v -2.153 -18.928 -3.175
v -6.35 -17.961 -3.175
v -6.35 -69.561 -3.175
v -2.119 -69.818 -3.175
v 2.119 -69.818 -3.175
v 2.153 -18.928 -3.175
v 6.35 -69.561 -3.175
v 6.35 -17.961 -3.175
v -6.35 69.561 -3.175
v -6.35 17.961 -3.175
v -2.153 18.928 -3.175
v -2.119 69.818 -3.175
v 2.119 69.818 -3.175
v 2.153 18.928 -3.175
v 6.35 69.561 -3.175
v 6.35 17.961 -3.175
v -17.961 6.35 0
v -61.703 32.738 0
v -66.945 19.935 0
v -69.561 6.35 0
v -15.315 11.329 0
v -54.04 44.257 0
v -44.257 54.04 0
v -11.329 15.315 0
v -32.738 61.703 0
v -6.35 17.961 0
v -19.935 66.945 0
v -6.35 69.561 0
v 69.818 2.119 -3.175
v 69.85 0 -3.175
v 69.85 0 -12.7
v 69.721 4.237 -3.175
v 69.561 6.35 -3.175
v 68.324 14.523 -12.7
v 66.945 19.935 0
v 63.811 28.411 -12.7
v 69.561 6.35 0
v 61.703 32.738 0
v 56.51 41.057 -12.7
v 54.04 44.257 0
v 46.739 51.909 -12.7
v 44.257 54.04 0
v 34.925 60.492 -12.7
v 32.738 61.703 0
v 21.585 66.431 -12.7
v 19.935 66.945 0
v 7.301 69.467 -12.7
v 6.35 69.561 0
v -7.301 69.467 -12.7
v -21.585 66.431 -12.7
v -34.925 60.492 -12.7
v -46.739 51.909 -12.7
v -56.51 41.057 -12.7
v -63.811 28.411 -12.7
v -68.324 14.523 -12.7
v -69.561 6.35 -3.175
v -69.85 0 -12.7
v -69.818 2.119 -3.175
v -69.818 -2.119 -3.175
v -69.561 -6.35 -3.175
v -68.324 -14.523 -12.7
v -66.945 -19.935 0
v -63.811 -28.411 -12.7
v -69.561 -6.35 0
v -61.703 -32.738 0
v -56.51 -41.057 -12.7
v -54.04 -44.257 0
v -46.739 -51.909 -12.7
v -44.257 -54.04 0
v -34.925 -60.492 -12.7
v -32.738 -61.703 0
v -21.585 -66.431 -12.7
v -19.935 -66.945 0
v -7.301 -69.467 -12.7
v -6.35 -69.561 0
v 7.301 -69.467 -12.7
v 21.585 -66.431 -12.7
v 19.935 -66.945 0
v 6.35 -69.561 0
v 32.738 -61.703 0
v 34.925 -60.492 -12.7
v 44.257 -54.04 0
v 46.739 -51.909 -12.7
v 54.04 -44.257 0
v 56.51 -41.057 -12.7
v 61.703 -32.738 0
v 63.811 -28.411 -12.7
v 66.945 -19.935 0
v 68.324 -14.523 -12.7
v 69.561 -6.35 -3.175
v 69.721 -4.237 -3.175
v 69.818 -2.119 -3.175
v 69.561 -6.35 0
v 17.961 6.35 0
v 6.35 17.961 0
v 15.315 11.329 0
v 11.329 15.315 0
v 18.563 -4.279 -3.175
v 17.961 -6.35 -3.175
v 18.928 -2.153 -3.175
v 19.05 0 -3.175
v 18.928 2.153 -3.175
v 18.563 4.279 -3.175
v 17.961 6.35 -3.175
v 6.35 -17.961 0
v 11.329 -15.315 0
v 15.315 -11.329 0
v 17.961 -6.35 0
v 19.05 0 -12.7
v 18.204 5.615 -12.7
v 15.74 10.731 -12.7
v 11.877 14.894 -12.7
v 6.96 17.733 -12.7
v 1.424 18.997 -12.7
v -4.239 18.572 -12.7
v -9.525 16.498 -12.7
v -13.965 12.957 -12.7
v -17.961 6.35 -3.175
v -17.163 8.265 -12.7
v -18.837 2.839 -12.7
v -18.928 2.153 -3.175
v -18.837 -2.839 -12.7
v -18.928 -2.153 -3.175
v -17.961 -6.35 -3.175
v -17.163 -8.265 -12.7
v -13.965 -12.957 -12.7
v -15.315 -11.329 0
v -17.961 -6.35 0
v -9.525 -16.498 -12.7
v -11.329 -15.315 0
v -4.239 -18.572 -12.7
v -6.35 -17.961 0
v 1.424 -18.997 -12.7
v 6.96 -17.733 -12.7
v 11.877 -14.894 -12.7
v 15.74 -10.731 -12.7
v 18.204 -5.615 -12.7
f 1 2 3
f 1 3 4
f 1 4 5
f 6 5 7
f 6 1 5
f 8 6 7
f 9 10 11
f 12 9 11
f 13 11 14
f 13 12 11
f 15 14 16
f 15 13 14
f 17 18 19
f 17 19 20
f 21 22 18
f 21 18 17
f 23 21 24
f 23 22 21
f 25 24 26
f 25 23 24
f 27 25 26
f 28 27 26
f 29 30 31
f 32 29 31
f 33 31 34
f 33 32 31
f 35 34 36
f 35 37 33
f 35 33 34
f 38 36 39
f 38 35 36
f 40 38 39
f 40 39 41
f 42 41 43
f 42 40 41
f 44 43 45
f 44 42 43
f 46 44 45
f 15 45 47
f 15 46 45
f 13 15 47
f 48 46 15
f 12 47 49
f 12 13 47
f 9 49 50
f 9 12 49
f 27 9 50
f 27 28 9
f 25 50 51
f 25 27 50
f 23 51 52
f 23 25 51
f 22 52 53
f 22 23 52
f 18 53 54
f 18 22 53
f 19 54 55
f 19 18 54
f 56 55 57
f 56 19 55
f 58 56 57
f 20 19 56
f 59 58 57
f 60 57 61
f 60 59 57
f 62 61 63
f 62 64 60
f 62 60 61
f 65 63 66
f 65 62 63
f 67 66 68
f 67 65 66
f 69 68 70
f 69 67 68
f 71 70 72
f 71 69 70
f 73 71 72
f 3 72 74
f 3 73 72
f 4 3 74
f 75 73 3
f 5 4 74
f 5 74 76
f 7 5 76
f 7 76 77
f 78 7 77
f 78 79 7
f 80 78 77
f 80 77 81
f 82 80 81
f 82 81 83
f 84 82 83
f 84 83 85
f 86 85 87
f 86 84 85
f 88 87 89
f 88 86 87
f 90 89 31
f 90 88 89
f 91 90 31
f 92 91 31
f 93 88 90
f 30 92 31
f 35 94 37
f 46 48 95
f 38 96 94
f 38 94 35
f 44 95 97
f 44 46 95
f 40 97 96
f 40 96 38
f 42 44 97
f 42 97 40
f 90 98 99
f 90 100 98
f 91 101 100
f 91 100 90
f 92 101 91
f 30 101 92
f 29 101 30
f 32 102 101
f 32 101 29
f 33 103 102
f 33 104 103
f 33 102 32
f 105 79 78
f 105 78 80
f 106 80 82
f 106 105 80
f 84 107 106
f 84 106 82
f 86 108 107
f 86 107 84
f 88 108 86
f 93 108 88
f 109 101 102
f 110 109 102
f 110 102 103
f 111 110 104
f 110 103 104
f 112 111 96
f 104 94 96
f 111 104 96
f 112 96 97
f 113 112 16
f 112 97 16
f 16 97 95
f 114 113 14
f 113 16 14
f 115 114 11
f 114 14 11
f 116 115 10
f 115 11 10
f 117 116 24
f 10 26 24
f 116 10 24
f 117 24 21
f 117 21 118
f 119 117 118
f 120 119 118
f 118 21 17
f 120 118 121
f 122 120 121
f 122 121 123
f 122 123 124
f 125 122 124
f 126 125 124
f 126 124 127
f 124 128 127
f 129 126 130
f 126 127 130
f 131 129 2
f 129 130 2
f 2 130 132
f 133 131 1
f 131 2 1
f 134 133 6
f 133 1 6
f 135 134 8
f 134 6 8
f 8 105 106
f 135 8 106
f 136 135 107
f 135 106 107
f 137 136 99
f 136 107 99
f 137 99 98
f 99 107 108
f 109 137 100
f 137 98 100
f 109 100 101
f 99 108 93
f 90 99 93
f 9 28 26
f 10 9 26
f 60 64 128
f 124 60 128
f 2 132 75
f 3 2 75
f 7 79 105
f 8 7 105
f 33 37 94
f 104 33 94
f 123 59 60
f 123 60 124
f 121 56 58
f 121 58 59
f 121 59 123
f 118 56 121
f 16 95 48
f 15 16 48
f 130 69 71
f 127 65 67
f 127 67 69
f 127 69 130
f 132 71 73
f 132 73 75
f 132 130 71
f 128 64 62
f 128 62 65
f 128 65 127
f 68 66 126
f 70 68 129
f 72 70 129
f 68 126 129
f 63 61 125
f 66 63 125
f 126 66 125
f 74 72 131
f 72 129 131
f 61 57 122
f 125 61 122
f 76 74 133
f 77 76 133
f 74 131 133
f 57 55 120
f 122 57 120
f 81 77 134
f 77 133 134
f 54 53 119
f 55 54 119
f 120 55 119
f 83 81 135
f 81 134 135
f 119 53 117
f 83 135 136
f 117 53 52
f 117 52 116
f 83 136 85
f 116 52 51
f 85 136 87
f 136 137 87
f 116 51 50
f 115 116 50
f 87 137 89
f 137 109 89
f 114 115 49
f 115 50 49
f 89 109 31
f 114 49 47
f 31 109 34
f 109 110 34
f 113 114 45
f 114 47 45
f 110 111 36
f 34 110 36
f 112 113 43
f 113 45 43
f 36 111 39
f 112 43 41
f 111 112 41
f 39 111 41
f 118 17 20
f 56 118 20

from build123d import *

# Parameters (mm, degrees)
F0_R     = 69.85
F1_DEPTH = 12.7
F3_DEPTH = 3.175
F4_R     = 19.05
F5_DEPTH = 12.701


with BuildPart() as f1:
    # F0 (on Top) → F1 (new body)
    with BuildSketch(Plane.XY):
        Circle(F0_R)
    extrude(amount=-F1_DEPTH)

    # F2 (on Top) → F3 (cut)
    with BuildSketch(Plane.XY):
        Polygon((6.35, 76.042563), (-6.35, 76.042563), (-6.35, 6.35), (-75.381324, 6.35), (-75.381324, -6.35), (-6.35, -6.35), (-6.35, -74.058846), (6.35, -74.058846), (6.35, -6.35), (76.042563, -6.35), (76.042563, 6.35), (6.35, 6.35), align=None)
    extrude(amount=-F3_DEPTH, mode=Mode.SUBTRACT)

    # F4 (on Top) → F5 (cut, through all)
    with BuildSketch(Plane.XY):
        Circle(F4_R)
    extrude(amount=-F5_DEPTH, mode=Mode.SUBTRACT)


solid = f1.part
